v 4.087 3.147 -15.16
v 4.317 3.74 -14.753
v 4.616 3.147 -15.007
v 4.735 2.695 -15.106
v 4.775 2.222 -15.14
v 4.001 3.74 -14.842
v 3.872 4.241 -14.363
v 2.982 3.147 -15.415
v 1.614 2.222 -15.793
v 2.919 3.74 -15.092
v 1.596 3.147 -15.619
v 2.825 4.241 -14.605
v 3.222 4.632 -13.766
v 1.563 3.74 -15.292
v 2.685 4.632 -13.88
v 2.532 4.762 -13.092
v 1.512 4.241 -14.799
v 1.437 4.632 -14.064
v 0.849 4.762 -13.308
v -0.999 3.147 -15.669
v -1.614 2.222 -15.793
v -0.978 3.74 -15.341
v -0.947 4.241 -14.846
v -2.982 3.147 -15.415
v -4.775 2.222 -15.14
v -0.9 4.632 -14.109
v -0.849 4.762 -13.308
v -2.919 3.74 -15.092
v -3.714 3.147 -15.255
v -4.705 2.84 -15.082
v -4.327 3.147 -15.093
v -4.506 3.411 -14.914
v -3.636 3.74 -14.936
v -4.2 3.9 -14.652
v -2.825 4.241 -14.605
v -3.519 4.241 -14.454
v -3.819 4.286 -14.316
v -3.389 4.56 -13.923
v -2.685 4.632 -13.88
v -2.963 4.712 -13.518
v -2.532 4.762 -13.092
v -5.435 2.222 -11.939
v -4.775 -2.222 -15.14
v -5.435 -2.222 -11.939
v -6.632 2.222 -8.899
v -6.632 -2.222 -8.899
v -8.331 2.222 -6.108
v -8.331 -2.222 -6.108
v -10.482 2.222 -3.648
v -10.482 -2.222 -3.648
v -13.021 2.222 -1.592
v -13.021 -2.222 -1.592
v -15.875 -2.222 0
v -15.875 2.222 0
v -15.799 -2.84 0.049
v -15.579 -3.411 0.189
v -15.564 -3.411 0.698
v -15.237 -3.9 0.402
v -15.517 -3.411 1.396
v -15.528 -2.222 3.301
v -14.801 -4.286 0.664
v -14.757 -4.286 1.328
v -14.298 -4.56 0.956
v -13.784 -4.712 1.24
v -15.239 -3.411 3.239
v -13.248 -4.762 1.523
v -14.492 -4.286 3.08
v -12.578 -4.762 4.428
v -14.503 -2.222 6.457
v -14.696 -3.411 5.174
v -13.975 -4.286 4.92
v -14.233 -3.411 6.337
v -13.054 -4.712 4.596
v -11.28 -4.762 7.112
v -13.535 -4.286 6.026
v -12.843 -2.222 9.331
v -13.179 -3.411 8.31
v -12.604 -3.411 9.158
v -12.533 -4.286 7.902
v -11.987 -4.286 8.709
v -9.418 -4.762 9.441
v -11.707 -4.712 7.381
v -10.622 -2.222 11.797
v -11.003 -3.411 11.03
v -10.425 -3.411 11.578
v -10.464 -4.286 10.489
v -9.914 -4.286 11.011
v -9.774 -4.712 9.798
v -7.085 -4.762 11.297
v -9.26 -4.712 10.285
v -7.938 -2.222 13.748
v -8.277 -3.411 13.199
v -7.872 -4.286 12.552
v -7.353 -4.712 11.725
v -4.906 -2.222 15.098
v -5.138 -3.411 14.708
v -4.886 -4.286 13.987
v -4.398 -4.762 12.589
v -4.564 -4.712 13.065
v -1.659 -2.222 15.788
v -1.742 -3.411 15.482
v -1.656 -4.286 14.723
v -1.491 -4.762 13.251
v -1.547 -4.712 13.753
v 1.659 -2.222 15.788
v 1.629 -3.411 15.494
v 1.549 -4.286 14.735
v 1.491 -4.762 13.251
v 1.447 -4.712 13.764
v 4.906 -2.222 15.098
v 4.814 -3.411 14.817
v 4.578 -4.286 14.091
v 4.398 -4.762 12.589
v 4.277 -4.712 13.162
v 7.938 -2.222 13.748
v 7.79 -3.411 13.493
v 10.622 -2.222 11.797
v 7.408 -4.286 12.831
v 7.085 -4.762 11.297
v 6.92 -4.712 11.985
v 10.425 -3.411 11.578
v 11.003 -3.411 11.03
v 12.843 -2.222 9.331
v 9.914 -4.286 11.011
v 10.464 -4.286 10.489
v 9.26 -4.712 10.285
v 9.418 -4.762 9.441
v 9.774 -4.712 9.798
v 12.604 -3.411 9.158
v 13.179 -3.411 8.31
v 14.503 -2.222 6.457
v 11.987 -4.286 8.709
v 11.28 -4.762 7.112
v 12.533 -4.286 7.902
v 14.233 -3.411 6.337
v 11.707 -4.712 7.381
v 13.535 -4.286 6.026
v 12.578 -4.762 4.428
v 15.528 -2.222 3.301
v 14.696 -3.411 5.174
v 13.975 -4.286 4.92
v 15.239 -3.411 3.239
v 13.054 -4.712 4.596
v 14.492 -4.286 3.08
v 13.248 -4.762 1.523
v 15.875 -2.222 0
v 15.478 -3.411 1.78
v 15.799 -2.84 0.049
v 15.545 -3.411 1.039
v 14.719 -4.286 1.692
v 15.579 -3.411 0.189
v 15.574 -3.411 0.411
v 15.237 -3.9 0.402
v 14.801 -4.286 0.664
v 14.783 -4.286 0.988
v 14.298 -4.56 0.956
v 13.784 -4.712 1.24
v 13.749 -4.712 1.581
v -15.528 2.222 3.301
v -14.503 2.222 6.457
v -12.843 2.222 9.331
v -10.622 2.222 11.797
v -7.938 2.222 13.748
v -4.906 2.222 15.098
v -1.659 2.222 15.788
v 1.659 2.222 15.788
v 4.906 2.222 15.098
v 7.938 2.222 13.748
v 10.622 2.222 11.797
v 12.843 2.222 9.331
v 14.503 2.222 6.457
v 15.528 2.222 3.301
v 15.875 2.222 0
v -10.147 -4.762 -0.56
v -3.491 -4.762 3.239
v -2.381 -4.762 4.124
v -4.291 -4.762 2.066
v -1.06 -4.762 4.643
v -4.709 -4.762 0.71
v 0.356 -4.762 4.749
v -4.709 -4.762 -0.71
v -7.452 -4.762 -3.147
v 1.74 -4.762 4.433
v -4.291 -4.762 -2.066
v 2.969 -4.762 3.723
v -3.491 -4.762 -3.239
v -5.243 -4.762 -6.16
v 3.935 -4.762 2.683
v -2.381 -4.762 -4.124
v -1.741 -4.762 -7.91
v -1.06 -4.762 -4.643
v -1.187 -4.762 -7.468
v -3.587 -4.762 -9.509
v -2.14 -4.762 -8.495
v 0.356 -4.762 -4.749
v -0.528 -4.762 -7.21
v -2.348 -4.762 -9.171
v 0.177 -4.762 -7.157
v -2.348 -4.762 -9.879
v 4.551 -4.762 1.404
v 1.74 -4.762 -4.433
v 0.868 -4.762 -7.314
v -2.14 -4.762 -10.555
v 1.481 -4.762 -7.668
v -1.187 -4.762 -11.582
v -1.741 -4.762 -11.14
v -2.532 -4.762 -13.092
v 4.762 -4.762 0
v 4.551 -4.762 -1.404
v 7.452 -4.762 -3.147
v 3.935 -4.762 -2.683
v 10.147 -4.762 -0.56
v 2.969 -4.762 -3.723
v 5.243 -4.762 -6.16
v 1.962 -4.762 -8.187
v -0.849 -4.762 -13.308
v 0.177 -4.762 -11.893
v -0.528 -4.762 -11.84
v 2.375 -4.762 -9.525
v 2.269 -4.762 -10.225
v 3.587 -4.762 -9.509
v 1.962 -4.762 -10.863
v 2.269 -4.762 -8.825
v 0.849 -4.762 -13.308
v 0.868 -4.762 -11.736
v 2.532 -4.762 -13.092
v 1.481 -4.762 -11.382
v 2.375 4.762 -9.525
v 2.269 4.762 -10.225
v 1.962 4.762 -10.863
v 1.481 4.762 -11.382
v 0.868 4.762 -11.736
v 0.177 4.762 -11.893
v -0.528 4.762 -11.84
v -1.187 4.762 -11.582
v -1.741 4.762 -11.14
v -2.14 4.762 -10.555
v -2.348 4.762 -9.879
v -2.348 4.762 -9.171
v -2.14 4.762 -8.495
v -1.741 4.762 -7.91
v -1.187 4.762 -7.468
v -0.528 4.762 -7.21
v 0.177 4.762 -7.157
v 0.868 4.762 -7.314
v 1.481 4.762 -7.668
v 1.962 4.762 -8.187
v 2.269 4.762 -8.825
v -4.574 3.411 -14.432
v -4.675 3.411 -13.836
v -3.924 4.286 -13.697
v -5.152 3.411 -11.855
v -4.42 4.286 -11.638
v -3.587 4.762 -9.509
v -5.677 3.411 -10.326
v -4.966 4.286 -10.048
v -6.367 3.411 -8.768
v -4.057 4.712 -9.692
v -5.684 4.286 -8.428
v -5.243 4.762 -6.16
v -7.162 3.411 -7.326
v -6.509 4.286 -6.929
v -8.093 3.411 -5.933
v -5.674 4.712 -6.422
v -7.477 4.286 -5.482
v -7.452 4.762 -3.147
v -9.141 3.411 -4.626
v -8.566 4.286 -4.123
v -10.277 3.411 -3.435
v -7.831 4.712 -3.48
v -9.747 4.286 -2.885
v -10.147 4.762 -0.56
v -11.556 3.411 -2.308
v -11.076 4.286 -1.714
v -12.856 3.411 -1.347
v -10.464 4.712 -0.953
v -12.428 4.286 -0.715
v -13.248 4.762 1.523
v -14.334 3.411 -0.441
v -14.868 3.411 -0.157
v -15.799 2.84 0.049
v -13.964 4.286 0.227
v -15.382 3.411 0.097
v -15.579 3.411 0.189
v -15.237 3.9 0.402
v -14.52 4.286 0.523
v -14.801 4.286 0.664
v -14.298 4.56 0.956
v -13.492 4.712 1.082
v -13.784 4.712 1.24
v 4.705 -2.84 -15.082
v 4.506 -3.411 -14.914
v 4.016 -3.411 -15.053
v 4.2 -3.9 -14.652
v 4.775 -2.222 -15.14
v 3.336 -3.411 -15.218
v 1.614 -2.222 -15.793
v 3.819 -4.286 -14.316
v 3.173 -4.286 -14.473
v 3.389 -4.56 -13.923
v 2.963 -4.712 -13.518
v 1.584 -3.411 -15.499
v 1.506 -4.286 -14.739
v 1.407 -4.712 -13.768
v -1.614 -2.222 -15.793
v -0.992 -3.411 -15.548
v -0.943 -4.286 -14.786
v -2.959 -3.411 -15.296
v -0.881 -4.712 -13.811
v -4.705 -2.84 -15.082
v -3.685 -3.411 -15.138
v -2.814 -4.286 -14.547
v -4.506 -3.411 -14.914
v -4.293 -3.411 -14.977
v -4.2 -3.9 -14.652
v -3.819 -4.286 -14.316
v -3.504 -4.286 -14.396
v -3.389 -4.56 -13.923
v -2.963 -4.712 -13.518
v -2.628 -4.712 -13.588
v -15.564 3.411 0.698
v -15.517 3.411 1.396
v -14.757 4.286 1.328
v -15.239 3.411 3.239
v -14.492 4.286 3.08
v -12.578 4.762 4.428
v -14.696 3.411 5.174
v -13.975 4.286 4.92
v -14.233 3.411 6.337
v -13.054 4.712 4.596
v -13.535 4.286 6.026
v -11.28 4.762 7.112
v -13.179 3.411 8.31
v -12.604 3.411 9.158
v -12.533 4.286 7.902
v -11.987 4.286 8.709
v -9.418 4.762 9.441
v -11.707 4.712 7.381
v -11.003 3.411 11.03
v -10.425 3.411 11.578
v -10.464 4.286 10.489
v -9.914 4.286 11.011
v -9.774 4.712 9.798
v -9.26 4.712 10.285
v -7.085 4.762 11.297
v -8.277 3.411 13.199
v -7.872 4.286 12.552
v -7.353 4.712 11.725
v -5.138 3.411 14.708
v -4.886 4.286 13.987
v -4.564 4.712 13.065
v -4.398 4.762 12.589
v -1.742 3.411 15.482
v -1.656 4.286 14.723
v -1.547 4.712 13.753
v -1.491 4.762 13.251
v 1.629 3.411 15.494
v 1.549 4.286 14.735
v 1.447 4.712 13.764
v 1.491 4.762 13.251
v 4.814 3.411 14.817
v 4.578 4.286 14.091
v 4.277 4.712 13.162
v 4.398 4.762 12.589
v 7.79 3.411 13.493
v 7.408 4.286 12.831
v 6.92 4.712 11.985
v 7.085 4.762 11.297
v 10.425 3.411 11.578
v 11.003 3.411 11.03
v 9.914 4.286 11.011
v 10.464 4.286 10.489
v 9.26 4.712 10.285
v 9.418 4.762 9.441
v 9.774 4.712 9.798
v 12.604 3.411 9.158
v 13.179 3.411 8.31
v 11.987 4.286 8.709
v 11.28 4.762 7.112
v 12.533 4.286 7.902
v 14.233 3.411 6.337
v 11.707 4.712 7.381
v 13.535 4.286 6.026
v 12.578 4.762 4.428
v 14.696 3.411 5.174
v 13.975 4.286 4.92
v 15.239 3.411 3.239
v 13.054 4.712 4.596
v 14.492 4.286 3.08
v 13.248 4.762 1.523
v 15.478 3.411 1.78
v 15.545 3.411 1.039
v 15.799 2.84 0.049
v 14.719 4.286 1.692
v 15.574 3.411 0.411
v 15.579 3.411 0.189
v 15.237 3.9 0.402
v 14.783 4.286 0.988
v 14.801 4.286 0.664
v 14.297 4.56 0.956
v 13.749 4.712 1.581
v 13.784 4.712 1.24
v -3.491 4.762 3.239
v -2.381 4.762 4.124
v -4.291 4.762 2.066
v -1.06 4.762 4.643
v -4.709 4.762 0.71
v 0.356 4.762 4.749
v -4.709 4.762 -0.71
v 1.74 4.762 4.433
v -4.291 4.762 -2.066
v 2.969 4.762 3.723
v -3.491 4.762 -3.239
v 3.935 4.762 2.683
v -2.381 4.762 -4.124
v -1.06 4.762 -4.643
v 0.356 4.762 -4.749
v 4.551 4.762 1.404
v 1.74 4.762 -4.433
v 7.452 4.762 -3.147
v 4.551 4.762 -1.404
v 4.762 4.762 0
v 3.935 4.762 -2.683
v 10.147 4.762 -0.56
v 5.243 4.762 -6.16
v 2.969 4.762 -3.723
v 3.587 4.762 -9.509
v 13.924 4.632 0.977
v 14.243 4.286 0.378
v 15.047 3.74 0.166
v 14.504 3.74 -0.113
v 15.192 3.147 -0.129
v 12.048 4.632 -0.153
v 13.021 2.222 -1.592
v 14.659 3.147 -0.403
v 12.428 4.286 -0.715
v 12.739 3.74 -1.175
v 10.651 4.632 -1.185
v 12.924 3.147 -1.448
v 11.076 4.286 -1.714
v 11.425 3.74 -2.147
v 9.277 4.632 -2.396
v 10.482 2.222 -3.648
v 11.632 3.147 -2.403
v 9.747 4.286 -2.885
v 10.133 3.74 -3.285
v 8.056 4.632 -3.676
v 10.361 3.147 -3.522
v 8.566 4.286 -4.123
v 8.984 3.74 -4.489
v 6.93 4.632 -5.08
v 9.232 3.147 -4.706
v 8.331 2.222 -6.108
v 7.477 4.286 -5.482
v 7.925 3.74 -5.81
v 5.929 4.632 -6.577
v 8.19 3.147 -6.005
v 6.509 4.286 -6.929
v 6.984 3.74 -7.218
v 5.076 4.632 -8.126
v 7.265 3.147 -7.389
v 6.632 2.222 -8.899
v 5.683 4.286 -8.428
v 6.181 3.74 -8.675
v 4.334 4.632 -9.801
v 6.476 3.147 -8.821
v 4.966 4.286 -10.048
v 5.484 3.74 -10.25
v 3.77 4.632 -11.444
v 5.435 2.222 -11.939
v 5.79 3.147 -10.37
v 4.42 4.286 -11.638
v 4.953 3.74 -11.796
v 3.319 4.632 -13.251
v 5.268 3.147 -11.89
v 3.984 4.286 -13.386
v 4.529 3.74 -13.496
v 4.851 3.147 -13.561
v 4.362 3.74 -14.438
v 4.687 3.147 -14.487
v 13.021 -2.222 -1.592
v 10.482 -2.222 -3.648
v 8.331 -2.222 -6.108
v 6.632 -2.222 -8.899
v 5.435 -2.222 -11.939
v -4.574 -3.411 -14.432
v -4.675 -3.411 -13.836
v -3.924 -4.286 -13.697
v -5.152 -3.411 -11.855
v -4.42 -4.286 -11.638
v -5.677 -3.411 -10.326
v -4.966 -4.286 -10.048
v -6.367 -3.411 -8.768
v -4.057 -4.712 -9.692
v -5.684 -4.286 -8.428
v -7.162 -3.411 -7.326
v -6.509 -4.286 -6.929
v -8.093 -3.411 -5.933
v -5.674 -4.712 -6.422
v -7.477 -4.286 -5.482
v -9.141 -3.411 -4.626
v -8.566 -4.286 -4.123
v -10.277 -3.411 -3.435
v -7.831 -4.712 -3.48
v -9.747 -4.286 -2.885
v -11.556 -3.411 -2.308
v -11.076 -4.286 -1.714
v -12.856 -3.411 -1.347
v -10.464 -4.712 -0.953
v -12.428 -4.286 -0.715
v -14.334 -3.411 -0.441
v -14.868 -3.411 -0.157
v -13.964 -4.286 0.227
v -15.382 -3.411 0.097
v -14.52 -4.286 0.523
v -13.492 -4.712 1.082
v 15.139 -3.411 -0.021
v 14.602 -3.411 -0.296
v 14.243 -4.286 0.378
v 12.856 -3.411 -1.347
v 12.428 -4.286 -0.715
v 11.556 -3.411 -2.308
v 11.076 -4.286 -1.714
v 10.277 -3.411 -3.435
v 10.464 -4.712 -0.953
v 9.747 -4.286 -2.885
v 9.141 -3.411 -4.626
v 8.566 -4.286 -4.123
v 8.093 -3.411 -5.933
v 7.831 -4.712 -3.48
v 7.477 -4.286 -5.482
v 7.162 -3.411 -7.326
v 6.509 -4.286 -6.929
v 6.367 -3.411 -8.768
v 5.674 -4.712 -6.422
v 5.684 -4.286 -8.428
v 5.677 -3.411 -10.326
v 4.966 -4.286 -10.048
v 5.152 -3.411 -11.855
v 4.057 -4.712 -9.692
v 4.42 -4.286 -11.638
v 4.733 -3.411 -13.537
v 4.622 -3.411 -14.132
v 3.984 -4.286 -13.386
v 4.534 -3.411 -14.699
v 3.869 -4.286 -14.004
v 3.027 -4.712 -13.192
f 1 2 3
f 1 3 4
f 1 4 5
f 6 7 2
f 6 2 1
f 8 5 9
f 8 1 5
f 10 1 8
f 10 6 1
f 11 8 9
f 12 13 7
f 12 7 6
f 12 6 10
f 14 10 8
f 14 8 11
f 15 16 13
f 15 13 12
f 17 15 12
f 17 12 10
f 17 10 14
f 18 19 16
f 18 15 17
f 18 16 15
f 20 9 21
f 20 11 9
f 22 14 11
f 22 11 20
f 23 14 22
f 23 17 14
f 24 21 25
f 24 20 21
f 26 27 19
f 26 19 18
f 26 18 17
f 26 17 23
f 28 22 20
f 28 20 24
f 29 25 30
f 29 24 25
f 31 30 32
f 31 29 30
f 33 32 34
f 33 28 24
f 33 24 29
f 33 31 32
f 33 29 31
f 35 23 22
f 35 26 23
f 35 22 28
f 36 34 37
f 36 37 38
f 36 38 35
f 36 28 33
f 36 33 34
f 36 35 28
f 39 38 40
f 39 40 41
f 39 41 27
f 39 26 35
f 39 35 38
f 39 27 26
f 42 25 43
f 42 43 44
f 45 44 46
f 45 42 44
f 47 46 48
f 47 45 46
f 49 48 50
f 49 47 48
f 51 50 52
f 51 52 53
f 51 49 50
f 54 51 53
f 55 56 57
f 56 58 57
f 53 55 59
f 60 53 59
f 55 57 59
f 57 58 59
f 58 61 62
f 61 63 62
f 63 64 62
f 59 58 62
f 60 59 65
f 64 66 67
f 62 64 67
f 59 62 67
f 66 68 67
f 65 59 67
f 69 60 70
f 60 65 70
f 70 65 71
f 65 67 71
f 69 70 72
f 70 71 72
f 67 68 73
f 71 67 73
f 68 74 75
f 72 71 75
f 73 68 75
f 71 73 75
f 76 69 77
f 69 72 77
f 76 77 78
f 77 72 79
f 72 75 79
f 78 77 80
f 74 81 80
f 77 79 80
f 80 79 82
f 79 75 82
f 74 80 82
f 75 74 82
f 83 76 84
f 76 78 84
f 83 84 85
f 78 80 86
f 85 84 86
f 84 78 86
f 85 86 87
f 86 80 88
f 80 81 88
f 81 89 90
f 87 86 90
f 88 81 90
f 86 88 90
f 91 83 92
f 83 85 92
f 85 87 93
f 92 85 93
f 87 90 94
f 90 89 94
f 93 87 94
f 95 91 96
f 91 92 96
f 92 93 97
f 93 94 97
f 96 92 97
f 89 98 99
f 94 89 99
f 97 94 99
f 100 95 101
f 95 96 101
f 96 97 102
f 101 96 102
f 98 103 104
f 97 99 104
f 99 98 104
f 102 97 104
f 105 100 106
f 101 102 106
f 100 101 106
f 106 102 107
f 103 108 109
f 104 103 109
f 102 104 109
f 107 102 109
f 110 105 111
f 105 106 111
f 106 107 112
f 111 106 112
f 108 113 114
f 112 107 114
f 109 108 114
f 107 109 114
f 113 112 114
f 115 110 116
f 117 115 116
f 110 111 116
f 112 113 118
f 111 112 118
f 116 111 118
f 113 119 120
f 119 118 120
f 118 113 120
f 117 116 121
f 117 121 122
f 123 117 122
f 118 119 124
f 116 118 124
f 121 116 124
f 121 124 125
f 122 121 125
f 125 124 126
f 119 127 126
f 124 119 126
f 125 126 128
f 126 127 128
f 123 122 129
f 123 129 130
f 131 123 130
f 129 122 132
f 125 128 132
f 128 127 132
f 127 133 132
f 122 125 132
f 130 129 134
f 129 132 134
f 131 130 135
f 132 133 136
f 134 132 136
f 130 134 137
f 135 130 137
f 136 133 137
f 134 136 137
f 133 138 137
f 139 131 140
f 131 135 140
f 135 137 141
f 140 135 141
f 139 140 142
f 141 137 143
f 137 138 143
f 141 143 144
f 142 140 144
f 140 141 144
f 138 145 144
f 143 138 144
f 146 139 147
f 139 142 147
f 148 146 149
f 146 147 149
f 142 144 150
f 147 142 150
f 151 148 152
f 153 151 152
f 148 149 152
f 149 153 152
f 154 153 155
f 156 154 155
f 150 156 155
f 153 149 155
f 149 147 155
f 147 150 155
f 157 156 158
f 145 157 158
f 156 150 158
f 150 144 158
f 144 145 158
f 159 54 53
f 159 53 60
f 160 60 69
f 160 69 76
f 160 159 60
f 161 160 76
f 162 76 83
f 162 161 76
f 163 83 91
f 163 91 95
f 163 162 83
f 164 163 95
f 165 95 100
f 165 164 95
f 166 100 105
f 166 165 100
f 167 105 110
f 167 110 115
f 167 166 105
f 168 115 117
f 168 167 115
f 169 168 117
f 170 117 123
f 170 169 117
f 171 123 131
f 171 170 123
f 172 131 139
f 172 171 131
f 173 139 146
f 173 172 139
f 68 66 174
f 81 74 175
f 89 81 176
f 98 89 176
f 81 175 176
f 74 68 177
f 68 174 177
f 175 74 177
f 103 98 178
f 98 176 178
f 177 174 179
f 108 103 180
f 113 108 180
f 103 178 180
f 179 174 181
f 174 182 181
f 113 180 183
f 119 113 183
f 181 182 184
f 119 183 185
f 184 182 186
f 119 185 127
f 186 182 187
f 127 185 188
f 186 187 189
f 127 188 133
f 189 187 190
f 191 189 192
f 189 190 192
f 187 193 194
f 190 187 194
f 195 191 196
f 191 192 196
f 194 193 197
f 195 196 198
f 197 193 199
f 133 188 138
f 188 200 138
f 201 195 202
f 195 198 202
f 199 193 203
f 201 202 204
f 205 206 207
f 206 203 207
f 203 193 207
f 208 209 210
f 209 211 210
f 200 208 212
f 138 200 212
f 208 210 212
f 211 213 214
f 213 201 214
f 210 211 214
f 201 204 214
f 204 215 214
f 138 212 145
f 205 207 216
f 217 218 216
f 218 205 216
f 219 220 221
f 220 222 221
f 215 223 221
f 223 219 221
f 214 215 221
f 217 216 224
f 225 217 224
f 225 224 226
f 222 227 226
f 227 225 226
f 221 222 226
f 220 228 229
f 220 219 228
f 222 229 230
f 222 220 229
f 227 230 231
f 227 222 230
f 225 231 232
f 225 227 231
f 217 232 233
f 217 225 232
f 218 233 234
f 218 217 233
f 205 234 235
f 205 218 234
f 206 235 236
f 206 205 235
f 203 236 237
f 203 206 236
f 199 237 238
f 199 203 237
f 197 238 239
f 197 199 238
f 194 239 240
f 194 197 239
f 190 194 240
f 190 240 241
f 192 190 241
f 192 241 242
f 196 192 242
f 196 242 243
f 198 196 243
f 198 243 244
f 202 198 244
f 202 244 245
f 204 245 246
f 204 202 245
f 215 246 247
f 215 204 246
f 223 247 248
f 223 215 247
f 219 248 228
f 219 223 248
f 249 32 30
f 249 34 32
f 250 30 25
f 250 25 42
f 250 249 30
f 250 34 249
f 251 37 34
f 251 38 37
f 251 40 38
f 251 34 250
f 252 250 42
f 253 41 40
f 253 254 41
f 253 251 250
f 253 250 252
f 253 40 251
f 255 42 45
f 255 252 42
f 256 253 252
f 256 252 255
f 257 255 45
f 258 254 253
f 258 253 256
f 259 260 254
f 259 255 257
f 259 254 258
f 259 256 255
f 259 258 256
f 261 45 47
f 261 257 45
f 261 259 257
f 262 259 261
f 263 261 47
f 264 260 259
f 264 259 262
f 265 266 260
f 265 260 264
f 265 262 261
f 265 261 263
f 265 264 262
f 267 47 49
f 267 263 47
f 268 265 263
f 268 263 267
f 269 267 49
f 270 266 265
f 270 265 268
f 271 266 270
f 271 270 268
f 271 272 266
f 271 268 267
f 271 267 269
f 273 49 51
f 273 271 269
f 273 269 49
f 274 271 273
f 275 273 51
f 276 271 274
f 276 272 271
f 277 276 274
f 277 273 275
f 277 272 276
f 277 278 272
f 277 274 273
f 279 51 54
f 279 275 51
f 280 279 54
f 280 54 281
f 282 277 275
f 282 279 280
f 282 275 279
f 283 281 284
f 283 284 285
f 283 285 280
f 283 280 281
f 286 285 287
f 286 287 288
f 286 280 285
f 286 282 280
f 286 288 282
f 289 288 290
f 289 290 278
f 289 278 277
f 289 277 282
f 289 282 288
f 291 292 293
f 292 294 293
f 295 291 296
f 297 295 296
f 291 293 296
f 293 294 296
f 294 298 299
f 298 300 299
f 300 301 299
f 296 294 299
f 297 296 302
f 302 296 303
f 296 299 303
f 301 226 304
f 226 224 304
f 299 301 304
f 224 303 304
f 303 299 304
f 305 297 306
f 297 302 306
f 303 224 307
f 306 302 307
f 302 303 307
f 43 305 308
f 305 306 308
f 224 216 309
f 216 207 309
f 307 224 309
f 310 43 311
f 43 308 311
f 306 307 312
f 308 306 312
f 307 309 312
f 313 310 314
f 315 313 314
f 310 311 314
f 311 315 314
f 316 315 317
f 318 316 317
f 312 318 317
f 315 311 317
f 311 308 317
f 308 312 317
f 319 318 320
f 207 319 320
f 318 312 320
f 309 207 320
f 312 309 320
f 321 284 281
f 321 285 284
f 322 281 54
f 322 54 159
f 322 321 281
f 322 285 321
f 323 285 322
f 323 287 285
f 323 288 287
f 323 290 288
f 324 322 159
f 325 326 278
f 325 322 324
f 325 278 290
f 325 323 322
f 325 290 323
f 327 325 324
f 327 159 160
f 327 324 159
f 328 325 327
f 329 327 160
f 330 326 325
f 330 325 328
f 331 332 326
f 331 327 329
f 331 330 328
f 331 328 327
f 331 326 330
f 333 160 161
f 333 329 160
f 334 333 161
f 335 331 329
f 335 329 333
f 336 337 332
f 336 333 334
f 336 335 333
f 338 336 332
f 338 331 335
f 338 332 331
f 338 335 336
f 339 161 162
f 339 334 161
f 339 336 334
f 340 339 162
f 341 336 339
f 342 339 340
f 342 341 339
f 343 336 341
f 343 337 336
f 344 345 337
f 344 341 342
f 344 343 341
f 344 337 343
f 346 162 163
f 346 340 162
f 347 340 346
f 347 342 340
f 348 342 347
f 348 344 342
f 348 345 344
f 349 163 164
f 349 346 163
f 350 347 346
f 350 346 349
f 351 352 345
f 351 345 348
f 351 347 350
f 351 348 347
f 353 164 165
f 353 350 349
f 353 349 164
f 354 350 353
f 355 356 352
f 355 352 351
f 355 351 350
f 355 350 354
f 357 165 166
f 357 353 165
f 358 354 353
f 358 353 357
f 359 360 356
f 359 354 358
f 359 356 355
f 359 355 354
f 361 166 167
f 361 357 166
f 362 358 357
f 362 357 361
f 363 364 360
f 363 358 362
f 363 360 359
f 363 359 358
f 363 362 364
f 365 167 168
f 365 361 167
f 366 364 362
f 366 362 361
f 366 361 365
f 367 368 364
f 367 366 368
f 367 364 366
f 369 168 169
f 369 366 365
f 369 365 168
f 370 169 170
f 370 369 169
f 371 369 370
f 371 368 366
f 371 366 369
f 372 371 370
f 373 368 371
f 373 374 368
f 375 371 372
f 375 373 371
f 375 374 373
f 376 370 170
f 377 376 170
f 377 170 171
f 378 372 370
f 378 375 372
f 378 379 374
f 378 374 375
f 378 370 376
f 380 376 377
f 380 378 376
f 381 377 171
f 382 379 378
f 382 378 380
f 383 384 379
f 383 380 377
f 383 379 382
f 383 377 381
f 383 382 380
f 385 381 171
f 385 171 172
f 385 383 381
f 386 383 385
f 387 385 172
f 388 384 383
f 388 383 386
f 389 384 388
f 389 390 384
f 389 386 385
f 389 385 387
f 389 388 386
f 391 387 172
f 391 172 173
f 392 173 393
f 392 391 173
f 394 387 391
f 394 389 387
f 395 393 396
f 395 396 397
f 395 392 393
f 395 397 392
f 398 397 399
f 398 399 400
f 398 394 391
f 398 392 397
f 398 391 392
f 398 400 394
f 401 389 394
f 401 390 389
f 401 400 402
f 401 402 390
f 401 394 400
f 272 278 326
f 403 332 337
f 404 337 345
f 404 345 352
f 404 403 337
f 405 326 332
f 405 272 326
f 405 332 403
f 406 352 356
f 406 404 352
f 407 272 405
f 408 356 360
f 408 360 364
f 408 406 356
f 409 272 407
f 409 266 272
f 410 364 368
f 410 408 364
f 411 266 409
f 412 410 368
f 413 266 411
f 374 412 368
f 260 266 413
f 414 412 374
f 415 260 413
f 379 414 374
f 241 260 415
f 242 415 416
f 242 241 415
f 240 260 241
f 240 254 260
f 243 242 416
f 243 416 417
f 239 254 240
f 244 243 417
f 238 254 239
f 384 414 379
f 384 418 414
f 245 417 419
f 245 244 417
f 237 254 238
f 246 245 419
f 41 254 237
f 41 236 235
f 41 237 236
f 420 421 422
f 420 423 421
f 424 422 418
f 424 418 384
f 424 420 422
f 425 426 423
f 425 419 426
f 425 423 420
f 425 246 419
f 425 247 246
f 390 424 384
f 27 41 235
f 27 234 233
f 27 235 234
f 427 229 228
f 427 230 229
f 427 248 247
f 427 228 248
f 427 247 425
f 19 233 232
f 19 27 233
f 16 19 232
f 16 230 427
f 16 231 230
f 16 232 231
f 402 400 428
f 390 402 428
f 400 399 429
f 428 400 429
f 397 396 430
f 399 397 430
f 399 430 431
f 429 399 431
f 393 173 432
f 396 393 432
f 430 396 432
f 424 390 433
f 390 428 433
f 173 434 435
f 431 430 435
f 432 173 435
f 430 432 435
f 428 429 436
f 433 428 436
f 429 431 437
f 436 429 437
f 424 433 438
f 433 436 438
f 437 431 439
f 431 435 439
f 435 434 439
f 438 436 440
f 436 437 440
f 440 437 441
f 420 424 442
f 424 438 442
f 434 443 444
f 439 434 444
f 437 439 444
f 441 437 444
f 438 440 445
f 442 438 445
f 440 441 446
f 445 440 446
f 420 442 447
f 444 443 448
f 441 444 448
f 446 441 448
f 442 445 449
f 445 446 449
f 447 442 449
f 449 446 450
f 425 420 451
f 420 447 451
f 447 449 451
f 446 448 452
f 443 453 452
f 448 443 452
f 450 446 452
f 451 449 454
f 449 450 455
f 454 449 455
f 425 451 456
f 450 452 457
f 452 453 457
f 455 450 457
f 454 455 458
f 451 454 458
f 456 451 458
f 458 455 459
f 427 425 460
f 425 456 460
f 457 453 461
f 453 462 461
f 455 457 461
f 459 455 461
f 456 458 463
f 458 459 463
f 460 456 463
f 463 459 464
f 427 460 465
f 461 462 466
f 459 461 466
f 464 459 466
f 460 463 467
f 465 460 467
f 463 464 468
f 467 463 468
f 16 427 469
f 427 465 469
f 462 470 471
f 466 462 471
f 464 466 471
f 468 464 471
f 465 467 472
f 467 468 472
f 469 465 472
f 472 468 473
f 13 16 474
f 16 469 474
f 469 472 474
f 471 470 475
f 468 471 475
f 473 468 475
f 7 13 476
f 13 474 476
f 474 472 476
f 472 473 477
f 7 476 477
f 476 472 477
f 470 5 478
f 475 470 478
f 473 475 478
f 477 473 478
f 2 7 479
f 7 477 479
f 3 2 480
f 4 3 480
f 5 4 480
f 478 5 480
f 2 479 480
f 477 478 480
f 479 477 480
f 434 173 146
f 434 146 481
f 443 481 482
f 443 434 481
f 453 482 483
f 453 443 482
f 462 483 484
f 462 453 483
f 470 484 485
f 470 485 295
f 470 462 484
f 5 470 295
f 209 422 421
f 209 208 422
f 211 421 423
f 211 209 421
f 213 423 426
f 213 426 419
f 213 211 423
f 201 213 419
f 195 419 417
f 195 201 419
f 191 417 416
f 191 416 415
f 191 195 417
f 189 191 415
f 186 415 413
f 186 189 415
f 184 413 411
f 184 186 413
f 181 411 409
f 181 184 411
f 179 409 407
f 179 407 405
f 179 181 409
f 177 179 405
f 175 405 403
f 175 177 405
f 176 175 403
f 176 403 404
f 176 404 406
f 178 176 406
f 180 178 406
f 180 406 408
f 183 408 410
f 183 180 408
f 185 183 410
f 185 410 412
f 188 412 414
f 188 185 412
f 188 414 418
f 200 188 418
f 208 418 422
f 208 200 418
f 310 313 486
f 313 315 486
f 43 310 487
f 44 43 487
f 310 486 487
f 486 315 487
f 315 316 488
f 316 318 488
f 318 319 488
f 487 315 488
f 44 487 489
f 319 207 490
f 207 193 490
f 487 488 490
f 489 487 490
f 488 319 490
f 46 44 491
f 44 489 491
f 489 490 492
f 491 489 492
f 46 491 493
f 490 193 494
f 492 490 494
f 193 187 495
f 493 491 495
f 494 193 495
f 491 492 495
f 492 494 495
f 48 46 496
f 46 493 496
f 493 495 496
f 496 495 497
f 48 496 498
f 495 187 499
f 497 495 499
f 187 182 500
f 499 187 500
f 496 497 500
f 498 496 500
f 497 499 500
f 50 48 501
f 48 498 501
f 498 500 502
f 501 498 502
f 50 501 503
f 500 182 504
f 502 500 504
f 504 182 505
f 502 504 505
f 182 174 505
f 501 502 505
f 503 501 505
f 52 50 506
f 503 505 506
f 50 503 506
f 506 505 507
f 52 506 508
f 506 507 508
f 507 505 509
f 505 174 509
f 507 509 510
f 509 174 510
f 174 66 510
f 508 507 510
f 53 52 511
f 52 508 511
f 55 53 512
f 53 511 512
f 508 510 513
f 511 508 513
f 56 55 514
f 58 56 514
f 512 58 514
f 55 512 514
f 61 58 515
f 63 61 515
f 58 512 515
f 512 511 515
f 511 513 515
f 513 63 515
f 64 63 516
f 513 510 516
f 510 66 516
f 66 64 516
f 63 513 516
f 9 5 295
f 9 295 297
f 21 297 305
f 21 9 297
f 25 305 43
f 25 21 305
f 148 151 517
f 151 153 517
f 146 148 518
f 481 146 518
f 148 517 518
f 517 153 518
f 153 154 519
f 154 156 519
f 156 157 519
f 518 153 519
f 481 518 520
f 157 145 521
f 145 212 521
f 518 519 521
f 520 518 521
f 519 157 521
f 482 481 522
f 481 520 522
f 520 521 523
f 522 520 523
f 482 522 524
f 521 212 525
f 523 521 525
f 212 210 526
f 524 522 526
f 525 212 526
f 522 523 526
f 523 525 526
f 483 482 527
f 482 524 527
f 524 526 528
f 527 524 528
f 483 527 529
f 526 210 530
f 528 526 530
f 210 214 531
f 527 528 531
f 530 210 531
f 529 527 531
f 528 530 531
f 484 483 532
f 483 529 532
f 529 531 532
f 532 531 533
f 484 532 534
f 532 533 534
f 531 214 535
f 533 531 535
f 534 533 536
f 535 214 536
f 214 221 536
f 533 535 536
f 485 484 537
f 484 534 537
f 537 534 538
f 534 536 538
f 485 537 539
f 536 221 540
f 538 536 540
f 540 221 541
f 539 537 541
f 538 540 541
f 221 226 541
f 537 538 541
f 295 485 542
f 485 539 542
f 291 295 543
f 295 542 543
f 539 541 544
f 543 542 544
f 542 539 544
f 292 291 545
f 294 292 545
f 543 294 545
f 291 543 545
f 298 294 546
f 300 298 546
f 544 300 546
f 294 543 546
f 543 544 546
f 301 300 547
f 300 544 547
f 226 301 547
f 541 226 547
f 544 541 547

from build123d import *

# Parameters (mm, degrees)
SKETCH1_R           = 4.7625
SKETCH1_R_2         = 2.3749
BOSS_EXTRUDE1_DEPTH = 4.7625
FILLET1_R           = 2.54


with BuildPart() as part:
    # Sketch1 → Boss-Extrude1 (new body, symmetric)
    with BuildSketch(Plane(origin=(0, 0, 0), x_dir=(1, 0, 0), z_dir=(0, 1, 0))):
        with BuildLine():
            ThreePointArc((-15.875, 0), (0, -15.875), (15.875, 0))
            ThreePointArc((15.875, 0), (8.330712377, 6.107698439), (4.7752, 15.139785004))
            ThreePointArc((4.7752, 15.139785004), (0, 15.875), (-4.7752, 15.139785004))
            ThreePointArc((-4.7752, 15.139785004), (-8.330712377, 6.107698439), (-15.875, 0))
        make_face()
        Circle(SKETCH1_R, mode=Mode.SUBTRACT)
        with Locations((0, 9.525)):
            Circle(SKETCH1_R_2, mode=Mode.SUBTRACT)
    extrude(amount=BOSS_EXTRUDE1_DEPTH, both=True)

    # Fillet1
    fillet1_edges = [part.edges().sort_by_distance(p)[0] for p in [
        (0, 4.7625, 15.875),
        (8.330712377, 4.7625, -6.107698439),
        (0, 4.7625, -15.875),
        (8.330712377, -4.7625, -6.107698439),
        (0, -4.7625, 15.875),
        (-8.330712377, -4.7625, -6.107698439),
        (0, -4.7625, -15.875),
        (-8.330712377, 4.7625, -6.107698439),
    ]]
    fillet(fillet1_edges, radius=FILLET1_R)


solid = part.part
